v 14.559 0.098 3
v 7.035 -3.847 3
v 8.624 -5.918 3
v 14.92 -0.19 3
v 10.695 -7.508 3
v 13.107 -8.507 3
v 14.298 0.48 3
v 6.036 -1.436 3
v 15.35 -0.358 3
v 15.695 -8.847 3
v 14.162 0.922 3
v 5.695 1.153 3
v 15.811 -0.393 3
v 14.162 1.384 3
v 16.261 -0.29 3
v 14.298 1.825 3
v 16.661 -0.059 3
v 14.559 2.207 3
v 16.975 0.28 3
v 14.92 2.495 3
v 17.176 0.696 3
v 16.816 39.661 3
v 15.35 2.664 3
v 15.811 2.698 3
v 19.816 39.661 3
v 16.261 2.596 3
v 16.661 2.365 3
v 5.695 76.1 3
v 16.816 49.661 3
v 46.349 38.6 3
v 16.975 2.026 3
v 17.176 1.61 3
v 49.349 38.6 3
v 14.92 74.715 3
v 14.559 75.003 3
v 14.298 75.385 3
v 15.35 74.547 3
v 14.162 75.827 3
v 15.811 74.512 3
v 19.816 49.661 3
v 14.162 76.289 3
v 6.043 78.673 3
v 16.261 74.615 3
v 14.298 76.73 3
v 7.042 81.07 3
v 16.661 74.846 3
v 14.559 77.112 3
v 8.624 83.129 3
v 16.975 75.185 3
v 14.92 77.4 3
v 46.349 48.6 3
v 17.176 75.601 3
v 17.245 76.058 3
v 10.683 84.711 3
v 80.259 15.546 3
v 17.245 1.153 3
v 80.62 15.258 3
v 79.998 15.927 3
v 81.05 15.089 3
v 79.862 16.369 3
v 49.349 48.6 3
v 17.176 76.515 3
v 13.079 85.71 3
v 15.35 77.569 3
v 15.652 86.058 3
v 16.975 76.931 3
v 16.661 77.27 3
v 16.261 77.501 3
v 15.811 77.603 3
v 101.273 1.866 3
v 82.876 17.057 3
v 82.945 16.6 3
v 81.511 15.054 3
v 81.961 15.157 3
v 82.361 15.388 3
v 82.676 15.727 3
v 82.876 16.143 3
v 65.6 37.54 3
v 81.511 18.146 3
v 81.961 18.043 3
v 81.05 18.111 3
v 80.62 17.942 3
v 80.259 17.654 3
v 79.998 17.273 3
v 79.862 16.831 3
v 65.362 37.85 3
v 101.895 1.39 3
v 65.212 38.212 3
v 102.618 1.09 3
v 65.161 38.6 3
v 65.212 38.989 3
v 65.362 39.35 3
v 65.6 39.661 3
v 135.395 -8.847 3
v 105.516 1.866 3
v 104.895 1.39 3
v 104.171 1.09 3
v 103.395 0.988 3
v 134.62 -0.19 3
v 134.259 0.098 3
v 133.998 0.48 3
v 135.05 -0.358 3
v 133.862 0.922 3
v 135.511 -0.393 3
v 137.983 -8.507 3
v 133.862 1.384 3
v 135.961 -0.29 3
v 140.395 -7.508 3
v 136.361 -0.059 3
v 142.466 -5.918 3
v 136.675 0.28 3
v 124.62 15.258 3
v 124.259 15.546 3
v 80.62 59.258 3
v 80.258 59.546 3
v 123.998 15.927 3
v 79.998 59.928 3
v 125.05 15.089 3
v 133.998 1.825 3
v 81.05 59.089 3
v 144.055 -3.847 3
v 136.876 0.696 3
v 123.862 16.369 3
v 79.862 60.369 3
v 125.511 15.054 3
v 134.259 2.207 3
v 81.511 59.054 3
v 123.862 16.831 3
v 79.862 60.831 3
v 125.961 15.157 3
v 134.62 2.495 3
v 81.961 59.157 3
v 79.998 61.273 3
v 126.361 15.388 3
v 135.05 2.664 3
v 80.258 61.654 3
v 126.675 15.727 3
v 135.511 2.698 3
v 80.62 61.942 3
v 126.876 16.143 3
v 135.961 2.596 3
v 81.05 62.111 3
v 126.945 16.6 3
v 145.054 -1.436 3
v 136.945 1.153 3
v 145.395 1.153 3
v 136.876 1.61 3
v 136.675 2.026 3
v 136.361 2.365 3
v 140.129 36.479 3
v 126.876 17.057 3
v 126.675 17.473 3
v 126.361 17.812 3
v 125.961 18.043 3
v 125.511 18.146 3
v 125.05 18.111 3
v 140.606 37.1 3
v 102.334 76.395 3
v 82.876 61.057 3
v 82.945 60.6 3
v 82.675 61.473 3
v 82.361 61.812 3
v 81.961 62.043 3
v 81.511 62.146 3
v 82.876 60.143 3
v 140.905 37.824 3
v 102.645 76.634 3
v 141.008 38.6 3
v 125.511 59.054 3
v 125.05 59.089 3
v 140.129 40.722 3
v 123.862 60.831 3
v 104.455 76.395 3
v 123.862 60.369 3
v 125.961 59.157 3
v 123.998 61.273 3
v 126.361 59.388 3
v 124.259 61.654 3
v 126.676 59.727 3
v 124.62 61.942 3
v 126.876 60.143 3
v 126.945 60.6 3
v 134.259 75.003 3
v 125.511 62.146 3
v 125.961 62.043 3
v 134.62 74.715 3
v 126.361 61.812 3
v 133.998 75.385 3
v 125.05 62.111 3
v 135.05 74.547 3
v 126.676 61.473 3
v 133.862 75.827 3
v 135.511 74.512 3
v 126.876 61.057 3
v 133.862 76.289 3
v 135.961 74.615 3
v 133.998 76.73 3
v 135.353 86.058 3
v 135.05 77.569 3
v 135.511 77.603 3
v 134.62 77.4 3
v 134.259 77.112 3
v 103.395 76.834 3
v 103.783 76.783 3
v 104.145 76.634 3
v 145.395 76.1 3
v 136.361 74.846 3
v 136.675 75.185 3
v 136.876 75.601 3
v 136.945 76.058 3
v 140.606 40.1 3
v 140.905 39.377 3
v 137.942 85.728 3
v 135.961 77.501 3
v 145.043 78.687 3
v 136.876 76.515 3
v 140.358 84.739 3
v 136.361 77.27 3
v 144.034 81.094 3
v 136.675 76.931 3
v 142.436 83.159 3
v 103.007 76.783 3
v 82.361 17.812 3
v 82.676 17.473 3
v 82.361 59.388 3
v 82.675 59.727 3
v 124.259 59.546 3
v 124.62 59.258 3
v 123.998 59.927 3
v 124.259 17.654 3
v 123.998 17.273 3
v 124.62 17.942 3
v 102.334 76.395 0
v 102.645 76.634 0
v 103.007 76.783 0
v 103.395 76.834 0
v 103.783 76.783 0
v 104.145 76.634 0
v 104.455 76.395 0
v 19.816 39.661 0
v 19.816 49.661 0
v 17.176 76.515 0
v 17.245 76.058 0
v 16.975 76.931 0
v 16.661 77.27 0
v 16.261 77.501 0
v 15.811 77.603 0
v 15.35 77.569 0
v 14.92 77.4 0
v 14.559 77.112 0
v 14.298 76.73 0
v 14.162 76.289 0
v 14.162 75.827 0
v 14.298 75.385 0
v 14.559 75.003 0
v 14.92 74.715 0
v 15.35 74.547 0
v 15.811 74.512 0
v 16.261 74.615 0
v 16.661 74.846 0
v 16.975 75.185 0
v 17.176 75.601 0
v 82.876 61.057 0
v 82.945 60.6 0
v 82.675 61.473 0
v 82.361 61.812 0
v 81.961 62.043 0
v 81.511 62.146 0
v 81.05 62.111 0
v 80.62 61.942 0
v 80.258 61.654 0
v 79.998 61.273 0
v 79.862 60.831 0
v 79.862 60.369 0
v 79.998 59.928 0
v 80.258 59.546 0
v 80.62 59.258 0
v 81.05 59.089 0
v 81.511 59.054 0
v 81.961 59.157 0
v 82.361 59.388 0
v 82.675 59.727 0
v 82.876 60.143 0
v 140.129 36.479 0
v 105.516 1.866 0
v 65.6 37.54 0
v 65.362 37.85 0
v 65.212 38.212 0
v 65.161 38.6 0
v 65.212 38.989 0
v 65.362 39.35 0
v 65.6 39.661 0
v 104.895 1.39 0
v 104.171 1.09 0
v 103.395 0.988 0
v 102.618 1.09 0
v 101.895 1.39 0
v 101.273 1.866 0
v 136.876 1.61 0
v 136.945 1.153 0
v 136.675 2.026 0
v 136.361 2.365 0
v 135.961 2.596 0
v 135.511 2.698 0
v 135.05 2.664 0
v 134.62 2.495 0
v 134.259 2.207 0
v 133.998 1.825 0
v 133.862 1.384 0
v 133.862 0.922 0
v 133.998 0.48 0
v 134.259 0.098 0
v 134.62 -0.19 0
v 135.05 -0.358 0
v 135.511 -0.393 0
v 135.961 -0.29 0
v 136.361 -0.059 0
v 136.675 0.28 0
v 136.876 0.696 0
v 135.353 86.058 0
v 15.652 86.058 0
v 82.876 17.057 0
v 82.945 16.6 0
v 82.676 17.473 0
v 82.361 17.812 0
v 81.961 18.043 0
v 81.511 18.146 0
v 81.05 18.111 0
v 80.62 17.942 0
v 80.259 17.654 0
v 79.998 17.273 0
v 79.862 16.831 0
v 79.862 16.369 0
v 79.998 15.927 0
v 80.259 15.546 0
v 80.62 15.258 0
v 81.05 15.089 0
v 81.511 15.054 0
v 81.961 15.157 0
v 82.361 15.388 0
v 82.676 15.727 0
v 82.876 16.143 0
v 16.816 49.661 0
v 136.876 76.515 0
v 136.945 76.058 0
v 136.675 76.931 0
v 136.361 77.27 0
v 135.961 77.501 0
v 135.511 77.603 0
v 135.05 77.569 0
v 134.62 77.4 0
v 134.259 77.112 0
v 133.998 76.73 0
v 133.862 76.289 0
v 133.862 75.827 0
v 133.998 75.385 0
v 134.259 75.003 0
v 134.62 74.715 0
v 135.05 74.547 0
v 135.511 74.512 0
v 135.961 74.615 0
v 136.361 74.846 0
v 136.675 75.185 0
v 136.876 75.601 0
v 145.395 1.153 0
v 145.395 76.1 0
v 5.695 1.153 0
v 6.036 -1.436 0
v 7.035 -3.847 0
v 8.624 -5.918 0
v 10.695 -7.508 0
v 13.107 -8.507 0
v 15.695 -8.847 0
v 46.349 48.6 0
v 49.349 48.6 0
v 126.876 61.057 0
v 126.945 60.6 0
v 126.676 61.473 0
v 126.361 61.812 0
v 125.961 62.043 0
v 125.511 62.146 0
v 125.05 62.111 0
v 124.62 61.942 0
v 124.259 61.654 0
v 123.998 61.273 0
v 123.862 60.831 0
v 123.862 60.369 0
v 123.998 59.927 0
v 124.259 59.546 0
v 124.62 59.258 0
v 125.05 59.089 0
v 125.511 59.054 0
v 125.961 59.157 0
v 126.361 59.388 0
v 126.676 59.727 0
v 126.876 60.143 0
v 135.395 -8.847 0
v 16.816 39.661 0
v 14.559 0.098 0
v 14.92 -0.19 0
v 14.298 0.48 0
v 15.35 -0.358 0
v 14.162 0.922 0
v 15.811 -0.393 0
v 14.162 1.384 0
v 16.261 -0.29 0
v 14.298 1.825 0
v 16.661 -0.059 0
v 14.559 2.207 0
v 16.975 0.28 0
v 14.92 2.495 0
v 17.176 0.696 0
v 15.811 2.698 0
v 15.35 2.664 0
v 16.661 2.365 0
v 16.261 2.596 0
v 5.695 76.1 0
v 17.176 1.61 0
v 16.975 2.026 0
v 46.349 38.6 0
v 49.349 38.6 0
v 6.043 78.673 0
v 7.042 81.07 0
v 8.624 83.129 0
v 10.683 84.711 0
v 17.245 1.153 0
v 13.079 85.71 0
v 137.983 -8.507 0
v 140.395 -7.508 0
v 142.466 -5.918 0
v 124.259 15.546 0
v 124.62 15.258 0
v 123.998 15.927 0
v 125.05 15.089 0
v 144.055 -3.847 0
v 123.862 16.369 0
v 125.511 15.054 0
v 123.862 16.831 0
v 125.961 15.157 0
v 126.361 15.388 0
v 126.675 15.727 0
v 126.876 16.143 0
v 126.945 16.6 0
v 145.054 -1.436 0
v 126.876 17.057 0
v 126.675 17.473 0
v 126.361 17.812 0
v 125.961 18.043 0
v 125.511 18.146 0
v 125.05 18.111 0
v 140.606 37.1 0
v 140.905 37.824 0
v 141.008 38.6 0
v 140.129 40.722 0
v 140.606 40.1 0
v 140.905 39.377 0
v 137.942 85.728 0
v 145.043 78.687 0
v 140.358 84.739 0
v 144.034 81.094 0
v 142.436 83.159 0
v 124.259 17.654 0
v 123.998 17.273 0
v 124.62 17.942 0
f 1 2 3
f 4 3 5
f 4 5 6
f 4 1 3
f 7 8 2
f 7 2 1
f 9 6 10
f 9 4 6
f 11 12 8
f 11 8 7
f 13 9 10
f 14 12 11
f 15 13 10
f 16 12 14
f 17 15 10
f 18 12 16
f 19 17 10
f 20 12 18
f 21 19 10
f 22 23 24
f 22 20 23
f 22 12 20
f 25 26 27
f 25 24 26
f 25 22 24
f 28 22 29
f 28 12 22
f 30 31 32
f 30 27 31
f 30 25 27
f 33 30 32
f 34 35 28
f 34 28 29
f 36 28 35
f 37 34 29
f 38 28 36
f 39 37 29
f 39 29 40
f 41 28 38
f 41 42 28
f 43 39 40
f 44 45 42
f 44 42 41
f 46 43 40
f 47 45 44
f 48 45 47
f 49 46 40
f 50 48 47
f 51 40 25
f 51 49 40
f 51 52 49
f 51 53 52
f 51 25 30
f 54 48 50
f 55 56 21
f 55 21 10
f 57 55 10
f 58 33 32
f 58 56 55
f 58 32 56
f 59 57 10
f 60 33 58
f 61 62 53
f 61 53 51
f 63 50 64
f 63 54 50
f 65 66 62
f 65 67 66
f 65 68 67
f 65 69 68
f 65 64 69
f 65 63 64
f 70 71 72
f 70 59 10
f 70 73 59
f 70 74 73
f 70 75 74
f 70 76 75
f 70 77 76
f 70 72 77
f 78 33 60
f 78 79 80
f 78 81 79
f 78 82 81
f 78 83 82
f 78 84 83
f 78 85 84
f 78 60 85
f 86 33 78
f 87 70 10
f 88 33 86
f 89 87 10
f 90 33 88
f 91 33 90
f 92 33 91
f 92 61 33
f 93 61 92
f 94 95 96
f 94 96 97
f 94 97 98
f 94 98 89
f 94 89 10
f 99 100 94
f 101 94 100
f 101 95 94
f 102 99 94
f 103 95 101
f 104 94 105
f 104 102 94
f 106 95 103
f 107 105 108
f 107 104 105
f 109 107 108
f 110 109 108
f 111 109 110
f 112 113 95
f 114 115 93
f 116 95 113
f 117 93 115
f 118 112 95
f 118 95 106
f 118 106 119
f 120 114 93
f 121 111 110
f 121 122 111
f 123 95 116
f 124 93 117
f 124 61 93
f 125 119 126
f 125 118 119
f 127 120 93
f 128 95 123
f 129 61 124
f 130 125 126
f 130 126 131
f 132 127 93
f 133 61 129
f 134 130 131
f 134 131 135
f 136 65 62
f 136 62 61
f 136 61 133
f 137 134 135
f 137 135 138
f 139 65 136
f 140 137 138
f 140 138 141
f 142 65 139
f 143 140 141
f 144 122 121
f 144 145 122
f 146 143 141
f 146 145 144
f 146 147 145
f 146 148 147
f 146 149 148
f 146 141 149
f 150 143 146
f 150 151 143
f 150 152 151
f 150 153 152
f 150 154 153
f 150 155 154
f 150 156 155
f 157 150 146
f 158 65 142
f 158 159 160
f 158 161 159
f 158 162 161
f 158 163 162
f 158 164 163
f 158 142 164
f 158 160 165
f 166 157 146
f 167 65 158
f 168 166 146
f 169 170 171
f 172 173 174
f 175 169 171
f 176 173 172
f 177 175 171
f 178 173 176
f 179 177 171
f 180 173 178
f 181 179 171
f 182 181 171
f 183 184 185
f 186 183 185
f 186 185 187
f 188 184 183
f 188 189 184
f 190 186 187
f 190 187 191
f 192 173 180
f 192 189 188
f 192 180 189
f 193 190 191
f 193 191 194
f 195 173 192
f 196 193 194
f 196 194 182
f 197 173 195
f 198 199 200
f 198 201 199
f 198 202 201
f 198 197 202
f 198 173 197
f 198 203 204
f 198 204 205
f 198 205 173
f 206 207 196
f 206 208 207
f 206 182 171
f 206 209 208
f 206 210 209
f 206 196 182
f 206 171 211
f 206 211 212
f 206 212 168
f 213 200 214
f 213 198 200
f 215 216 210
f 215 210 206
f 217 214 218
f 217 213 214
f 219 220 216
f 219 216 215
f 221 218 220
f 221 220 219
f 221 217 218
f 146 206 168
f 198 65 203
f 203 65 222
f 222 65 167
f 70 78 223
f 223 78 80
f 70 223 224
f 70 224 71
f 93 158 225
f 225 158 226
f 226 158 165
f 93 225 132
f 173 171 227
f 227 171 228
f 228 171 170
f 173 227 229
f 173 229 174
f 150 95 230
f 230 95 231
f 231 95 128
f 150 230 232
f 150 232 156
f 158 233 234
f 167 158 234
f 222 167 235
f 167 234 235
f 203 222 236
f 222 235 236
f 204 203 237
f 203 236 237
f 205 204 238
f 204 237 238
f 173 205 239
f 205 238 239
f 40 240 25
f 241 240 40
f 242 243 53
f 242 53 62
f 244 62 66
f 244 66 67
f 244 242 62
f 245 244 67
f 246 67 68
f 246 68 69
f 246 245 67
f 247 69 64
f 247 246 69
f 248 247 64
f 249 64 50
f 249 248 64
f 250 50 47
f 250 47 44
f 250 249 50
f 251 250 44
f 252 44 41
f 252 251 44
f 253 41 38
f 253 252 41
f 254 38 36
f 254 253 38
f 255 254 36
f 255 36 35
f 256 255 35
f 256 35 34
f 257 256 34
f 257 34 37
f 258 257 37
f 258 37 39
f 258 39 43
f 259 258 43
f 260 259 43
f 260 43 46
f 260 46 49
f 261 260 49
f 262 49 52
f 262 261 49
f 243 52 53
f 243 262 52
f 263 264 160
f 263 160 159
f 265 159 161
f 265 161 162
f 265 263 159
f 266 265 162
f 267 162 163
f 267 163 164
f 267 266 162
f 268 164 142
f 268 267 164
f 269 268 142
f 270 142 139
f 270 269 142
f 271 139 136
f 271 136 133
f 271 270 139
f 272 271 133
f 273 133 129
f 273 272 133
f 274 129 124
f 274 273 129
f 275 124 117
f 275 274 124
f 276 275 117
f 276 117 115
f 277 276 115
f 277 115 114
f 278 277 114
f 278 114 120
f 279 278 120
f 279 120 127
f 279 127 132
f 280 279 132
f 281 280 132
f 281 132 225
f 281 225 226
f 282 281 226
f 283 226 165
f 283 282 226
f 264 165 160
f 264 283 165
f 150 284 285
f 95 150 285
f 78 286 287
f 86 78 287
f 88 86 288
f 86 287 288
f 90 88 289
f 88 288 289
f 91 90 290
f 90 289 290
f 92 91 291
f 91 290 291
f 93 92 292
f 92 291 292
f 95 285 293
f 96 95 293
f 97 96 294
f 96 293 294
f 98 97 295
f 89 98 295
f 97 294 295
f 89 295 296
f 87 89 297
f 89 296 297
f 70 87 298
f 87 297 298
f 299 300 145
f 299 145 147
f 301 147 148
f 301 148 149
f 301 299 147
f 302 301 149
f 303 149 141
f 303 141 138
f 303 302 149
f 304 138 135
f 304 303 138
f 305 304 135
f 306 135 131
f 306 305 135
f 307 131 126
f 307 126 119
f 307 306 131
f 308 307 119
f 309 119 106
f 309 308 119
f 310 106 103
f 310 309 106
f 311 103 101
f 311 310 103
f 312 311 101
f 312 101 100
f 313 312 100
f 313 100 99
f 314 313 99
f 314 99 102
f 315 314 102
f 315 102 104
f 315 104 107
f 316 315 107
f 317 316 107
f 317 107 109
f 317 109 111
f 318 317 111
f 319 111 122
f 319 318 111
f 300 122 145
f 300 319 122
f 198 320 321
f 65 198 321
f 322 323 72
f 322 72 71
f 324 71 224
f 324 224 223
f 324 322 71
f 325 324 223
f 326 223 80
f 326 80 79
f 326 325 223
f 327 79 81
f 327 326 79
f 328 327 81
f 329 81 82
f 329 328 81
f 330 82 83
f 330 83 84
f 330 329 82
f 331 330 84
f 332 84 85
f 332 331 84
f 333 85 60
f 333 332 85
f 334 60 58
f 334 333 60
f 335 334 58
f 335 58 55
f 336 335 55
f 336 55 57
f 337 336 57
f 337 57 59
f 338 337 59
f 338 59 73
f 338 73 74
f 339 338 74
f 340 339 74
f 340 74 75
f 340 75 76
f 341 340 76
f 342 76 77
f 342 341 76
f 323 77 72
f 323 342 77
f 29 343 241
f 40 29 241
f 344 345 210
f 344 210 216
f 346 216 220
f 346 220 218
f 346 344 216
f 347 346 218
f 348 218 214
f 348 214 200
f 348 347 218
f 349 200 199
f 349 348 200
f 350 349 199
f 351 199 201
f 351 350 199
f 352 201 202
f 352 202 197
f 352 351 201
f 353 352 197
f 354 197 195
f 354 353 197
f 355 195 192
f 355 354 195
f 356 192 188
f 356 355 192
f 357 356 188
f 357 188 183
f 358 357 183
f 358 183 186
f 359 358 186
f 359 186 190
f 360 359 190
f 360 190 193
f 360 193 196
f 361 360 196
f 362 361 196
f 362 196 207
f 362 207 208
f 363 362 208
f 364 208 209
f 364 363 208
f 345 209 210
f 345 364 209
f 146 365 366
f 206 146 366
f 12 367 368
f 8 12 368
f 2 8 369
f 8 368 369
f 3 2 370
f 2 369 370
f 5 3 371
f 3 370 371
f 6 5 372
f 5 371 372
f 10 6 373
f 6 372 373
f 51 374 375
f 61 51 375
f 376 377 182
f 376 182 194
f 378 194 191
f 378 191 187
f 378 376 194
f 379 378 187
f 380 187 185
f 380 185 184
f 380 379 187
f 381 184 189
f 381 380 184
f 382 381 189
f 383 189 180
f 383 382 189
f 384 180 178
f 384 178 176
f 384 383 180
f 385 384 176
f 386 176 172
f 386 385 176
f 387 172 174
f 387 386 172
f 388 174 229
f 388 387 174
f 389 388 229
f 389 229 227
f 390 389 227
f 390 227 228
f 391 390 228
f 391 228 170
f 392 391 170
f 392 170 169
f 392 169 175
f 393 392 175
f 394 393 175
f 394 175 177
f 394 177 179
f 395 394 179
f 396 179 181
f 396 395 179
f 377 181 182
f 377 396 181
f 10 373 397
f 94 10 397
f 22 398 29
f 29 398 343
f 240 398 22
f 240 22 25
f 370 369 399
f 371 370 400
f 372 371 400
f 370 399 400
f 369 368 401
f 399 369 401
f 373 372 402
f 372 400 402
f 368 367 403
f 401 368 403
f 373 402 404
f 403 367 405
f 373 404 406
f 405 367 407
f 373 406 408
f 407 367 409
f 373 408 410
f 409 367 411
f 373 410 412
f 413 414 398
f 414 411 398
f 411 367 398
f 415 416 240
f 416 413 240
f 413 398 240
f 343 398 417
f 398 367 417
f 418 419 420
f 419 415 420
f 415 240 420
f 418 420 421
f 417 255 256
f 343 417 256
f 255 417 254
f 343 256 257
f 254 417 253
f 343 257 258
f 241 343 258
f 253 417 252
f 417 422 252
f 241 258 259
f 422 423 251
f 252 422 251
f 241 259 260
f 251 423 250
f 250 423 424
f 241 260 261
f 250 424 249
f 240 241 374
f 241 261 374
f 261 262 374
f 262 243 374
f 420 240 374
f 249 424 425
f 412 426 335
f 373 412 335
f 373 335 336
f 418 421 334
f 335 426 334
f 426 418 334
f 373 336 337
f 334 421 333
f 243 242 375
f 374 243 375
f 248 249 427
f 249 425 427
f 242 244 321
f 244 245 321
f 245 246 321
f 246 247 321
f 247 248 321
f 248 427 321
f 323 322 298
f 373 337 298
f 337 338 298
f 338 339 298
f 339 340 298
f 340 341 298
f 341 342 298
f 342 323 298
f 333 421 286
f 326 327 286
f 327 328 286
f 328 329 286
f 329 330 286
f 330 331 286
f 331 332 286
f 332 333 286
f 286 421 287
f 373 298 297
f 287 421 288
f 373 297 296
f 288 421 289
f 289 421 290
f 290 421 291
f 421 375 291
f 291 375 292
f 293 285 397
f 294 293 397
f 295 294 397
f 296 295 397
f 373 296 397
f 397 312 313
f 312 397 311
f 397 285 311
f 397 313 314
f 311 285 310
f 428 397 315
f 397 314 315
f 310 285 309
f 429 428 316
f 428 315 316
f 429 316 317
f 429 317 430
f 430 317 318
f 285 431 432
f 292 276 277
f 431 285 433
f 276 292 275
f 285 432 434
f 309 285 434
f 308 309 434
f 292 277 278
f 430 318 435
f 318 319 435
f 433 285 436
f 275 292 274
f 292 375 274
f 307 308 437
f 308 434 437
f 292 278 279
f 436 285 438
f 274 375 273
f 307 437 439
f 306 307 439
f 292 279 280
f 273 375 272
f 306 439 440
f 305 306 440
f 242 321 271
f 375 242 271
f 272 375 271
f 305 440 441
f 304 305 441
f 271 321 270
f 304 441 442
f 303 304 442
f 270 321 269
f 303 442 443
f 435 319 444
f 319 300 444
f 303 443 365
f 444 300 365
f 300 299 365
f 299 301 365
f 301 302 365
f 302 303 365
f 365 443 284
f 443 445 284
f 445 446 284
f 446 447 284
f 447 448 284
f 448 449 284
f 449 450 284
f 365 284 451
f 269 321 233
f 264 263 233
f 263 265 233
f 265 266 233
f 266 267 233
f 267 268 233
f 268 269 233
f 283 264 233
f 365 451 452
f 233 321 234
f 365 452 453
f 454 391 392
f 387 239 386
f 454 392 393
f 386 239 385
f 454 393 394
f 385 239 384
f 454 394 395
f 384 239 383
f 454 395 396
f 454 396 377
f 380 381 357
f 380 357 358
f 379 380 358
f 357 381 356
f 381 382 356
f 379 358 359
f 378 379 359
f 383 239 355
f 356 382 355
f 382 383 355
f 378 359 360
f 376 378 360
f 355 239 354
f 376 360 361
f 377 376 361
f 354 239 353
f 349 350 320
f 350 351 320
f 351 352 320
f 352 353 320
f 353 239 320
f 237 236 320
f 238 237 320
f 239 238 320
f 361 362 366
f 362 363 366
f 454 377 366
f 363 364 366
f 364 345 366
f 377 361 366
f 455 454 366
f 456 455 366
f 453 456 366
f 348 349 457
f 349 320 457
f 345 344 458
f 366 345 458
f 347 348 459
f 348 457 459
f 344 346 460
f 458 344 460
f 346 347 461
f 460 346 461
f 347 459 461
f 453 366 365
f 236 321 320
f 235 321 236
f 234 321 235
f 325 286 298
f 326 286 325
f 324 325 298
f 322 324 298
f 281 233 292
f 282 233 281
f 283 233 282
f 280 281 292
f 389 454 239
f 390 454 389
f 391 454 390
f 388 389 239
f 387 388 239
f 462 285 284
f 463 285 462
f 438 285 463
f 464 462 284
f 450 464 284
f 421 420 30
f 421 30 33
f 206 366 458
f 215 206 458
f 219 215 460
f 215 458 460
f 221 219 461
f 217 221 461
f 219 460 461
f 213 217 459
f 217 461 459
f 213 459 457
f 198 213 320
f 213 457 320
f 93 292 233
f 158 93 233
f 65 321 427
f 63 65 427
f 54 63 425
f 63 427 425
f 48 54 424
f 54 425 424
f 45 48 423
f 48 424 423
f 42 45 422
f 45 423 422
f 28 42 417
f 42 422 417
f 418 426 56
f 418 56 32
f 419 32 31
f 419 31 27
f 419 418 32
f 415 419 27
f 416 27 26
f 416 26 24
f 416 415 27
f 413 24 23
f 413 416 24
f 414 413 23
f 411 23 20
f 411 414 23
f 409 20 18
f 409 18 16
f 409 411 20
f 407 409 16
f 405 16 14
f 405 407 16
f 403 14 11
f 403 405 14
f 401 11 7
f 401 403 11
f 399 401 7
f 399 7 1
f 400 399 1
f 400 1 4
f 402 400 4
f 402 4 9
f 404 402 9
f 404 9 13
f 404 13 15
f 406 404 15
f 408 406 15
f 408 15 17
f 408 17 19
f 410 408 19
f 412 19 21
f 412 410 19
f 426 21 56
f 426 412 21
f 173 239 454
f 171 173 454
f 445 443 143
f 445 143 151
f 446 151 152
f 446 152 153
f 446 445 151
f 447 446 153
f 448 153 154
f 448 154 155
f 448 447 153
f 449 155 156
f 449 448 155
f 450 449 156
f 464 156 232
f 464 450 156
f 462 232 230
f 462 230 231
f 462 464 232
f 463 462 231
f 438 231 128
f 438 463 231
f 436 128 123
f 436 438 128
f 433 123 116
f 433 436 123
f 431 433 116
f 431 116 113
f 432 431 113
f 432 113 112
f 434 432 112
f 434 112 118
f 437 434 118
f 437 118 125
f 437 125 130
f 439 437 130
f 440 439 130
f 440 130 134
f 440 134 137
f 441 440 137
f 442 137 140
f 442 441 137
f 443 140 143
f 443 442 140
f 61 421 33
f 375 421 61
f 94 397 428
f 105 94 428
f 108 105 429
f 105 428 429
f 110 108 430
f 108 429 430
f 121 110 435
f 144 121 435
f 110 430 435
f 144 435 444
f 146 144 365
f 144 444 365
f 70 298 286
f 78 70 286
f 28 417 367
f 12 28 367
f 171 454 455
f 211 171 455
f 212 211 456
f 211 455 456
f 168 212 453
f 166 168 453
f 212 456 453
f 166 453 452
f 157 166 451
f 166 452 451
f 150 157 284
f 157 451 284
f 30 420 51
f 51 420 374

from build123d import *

# Parameters (mm, degrees)
MODEL_R             = 1.550000002
MODEL_R_2           = 1.550000003
MODEL_R_3           = 1.55
MODEL_W             = 3
MODEL_H             = 10
BOSS_EXTRUDE1_DEPTH = 3


with BuildPart() as part:
    # Model → Boss-Extrude1 (new body)
    with BuildSketch(Plane.XY):
        with BuildLine():
            Line((15.694779571, -8.847330863), (135.394779571, -8.847330863))
            ThreePointArc((135.394779571, -8.847330863), (142.465847383, -5.918398675), (145.394779571, 1.152669137))
            Line((145.394779571, 1.152669137), (145.394779571, 76.099977642))
            ThreePointArc((145.394779571, 76.099977642), (142.435982738, 83.158675114), (135.352544586, 86.057742657))
            Line((135.352544586, 86.057742657), (15.652444586, 86.057742657))
            ThreePointArc((15.652444586, 86.057742657), (8.623648393, 83.128873835), (5.694779571, 76.100077642))
            Line((5.694779571, 76.100077642), (5.694779571, 1.152669137))
            ThreePointArc((5.694779571, 1.152669137), (8.623711759, -5.918398675), (15.694779571, -8.847330863))
        make_face()
        with Locations((81.394879569, 16.599999996)):
            Circle(MODEL_R, mode=Mode.SUBTRACT)
        with Locations((81.394729575, 60.600050002)):
            Circle(MODEL_R, mode=Mode.SUBTRACT)
        with Locations((125.394779569, 16.6)):
            Circle(MODEL_R, mode=Mode.SUBTRACT)
        with Locations((125.394879569, 60.599999996)):
            Circle(MODEL_R, mode=Mode.SUBTRACT)
        with Locations((135.394779571, 76.057742657)):
            Circle(MODEL_R_2, mode=Mode.SUBTRACT)
        with Locations((135.394779571, 1.152669137)):
            Circle(MODEL_R_2, mode=Mode.SUBTRACT)
        with Locations((15.694779571, 76.057742657)):
            Circle(MODEL_R_2, mode=Mode.SUBTRACT)
        with Locations((15.694779571, 1.152669137)):
            Circle(MODEL_R_3, mode=Mode.SUBTRACT)
        with BuildLine():
            Line((101.273453006, 1.866320938), (65.600147072, 37.539741531))
            ThreePointArc((65.600147072, 37.539741531), (65.160808948, 38.600399998), (65.600147072, 39.661058465))
            Line((65.600147072, 39.661058465), (102.334113177, 76.395142639))
            ThreePointArc((102.334113177, 76.395142639), (103.394773848, 76.834484172), (104.455435225, 76.395144343))
            Line((104.455435225, 76.395144343), (140.128859227, 40.721720342))
            ThreePointArc((140.128859227, 40.721720342), (141.007538884, 38.600399998), (140.128859227, 36.479079655))
            Line((140.128859227, 36.479079655), (105.516097102, 1.866317529))
            ThreePointArc((105.516097102, 1.866317529), (103.394774348, 0.987637873), (101.273453006, 1.866320938))
        make_face(mode=Mode.SUBTRACT)
        with Locations((18.315849629, 44.661058465)):
            Rectangle(MODEL_W, MODEL_H, mode=Mode.SUBTRACT)
        with Locations((47.848560539, 43.600399998)):
            Rectangle(MODEL_W, MODEL_H, mode=Mode.SUBTRACT)
    extrude(amount=BOSS_EXTRUDE1_DEPTH)


solid = part.part
